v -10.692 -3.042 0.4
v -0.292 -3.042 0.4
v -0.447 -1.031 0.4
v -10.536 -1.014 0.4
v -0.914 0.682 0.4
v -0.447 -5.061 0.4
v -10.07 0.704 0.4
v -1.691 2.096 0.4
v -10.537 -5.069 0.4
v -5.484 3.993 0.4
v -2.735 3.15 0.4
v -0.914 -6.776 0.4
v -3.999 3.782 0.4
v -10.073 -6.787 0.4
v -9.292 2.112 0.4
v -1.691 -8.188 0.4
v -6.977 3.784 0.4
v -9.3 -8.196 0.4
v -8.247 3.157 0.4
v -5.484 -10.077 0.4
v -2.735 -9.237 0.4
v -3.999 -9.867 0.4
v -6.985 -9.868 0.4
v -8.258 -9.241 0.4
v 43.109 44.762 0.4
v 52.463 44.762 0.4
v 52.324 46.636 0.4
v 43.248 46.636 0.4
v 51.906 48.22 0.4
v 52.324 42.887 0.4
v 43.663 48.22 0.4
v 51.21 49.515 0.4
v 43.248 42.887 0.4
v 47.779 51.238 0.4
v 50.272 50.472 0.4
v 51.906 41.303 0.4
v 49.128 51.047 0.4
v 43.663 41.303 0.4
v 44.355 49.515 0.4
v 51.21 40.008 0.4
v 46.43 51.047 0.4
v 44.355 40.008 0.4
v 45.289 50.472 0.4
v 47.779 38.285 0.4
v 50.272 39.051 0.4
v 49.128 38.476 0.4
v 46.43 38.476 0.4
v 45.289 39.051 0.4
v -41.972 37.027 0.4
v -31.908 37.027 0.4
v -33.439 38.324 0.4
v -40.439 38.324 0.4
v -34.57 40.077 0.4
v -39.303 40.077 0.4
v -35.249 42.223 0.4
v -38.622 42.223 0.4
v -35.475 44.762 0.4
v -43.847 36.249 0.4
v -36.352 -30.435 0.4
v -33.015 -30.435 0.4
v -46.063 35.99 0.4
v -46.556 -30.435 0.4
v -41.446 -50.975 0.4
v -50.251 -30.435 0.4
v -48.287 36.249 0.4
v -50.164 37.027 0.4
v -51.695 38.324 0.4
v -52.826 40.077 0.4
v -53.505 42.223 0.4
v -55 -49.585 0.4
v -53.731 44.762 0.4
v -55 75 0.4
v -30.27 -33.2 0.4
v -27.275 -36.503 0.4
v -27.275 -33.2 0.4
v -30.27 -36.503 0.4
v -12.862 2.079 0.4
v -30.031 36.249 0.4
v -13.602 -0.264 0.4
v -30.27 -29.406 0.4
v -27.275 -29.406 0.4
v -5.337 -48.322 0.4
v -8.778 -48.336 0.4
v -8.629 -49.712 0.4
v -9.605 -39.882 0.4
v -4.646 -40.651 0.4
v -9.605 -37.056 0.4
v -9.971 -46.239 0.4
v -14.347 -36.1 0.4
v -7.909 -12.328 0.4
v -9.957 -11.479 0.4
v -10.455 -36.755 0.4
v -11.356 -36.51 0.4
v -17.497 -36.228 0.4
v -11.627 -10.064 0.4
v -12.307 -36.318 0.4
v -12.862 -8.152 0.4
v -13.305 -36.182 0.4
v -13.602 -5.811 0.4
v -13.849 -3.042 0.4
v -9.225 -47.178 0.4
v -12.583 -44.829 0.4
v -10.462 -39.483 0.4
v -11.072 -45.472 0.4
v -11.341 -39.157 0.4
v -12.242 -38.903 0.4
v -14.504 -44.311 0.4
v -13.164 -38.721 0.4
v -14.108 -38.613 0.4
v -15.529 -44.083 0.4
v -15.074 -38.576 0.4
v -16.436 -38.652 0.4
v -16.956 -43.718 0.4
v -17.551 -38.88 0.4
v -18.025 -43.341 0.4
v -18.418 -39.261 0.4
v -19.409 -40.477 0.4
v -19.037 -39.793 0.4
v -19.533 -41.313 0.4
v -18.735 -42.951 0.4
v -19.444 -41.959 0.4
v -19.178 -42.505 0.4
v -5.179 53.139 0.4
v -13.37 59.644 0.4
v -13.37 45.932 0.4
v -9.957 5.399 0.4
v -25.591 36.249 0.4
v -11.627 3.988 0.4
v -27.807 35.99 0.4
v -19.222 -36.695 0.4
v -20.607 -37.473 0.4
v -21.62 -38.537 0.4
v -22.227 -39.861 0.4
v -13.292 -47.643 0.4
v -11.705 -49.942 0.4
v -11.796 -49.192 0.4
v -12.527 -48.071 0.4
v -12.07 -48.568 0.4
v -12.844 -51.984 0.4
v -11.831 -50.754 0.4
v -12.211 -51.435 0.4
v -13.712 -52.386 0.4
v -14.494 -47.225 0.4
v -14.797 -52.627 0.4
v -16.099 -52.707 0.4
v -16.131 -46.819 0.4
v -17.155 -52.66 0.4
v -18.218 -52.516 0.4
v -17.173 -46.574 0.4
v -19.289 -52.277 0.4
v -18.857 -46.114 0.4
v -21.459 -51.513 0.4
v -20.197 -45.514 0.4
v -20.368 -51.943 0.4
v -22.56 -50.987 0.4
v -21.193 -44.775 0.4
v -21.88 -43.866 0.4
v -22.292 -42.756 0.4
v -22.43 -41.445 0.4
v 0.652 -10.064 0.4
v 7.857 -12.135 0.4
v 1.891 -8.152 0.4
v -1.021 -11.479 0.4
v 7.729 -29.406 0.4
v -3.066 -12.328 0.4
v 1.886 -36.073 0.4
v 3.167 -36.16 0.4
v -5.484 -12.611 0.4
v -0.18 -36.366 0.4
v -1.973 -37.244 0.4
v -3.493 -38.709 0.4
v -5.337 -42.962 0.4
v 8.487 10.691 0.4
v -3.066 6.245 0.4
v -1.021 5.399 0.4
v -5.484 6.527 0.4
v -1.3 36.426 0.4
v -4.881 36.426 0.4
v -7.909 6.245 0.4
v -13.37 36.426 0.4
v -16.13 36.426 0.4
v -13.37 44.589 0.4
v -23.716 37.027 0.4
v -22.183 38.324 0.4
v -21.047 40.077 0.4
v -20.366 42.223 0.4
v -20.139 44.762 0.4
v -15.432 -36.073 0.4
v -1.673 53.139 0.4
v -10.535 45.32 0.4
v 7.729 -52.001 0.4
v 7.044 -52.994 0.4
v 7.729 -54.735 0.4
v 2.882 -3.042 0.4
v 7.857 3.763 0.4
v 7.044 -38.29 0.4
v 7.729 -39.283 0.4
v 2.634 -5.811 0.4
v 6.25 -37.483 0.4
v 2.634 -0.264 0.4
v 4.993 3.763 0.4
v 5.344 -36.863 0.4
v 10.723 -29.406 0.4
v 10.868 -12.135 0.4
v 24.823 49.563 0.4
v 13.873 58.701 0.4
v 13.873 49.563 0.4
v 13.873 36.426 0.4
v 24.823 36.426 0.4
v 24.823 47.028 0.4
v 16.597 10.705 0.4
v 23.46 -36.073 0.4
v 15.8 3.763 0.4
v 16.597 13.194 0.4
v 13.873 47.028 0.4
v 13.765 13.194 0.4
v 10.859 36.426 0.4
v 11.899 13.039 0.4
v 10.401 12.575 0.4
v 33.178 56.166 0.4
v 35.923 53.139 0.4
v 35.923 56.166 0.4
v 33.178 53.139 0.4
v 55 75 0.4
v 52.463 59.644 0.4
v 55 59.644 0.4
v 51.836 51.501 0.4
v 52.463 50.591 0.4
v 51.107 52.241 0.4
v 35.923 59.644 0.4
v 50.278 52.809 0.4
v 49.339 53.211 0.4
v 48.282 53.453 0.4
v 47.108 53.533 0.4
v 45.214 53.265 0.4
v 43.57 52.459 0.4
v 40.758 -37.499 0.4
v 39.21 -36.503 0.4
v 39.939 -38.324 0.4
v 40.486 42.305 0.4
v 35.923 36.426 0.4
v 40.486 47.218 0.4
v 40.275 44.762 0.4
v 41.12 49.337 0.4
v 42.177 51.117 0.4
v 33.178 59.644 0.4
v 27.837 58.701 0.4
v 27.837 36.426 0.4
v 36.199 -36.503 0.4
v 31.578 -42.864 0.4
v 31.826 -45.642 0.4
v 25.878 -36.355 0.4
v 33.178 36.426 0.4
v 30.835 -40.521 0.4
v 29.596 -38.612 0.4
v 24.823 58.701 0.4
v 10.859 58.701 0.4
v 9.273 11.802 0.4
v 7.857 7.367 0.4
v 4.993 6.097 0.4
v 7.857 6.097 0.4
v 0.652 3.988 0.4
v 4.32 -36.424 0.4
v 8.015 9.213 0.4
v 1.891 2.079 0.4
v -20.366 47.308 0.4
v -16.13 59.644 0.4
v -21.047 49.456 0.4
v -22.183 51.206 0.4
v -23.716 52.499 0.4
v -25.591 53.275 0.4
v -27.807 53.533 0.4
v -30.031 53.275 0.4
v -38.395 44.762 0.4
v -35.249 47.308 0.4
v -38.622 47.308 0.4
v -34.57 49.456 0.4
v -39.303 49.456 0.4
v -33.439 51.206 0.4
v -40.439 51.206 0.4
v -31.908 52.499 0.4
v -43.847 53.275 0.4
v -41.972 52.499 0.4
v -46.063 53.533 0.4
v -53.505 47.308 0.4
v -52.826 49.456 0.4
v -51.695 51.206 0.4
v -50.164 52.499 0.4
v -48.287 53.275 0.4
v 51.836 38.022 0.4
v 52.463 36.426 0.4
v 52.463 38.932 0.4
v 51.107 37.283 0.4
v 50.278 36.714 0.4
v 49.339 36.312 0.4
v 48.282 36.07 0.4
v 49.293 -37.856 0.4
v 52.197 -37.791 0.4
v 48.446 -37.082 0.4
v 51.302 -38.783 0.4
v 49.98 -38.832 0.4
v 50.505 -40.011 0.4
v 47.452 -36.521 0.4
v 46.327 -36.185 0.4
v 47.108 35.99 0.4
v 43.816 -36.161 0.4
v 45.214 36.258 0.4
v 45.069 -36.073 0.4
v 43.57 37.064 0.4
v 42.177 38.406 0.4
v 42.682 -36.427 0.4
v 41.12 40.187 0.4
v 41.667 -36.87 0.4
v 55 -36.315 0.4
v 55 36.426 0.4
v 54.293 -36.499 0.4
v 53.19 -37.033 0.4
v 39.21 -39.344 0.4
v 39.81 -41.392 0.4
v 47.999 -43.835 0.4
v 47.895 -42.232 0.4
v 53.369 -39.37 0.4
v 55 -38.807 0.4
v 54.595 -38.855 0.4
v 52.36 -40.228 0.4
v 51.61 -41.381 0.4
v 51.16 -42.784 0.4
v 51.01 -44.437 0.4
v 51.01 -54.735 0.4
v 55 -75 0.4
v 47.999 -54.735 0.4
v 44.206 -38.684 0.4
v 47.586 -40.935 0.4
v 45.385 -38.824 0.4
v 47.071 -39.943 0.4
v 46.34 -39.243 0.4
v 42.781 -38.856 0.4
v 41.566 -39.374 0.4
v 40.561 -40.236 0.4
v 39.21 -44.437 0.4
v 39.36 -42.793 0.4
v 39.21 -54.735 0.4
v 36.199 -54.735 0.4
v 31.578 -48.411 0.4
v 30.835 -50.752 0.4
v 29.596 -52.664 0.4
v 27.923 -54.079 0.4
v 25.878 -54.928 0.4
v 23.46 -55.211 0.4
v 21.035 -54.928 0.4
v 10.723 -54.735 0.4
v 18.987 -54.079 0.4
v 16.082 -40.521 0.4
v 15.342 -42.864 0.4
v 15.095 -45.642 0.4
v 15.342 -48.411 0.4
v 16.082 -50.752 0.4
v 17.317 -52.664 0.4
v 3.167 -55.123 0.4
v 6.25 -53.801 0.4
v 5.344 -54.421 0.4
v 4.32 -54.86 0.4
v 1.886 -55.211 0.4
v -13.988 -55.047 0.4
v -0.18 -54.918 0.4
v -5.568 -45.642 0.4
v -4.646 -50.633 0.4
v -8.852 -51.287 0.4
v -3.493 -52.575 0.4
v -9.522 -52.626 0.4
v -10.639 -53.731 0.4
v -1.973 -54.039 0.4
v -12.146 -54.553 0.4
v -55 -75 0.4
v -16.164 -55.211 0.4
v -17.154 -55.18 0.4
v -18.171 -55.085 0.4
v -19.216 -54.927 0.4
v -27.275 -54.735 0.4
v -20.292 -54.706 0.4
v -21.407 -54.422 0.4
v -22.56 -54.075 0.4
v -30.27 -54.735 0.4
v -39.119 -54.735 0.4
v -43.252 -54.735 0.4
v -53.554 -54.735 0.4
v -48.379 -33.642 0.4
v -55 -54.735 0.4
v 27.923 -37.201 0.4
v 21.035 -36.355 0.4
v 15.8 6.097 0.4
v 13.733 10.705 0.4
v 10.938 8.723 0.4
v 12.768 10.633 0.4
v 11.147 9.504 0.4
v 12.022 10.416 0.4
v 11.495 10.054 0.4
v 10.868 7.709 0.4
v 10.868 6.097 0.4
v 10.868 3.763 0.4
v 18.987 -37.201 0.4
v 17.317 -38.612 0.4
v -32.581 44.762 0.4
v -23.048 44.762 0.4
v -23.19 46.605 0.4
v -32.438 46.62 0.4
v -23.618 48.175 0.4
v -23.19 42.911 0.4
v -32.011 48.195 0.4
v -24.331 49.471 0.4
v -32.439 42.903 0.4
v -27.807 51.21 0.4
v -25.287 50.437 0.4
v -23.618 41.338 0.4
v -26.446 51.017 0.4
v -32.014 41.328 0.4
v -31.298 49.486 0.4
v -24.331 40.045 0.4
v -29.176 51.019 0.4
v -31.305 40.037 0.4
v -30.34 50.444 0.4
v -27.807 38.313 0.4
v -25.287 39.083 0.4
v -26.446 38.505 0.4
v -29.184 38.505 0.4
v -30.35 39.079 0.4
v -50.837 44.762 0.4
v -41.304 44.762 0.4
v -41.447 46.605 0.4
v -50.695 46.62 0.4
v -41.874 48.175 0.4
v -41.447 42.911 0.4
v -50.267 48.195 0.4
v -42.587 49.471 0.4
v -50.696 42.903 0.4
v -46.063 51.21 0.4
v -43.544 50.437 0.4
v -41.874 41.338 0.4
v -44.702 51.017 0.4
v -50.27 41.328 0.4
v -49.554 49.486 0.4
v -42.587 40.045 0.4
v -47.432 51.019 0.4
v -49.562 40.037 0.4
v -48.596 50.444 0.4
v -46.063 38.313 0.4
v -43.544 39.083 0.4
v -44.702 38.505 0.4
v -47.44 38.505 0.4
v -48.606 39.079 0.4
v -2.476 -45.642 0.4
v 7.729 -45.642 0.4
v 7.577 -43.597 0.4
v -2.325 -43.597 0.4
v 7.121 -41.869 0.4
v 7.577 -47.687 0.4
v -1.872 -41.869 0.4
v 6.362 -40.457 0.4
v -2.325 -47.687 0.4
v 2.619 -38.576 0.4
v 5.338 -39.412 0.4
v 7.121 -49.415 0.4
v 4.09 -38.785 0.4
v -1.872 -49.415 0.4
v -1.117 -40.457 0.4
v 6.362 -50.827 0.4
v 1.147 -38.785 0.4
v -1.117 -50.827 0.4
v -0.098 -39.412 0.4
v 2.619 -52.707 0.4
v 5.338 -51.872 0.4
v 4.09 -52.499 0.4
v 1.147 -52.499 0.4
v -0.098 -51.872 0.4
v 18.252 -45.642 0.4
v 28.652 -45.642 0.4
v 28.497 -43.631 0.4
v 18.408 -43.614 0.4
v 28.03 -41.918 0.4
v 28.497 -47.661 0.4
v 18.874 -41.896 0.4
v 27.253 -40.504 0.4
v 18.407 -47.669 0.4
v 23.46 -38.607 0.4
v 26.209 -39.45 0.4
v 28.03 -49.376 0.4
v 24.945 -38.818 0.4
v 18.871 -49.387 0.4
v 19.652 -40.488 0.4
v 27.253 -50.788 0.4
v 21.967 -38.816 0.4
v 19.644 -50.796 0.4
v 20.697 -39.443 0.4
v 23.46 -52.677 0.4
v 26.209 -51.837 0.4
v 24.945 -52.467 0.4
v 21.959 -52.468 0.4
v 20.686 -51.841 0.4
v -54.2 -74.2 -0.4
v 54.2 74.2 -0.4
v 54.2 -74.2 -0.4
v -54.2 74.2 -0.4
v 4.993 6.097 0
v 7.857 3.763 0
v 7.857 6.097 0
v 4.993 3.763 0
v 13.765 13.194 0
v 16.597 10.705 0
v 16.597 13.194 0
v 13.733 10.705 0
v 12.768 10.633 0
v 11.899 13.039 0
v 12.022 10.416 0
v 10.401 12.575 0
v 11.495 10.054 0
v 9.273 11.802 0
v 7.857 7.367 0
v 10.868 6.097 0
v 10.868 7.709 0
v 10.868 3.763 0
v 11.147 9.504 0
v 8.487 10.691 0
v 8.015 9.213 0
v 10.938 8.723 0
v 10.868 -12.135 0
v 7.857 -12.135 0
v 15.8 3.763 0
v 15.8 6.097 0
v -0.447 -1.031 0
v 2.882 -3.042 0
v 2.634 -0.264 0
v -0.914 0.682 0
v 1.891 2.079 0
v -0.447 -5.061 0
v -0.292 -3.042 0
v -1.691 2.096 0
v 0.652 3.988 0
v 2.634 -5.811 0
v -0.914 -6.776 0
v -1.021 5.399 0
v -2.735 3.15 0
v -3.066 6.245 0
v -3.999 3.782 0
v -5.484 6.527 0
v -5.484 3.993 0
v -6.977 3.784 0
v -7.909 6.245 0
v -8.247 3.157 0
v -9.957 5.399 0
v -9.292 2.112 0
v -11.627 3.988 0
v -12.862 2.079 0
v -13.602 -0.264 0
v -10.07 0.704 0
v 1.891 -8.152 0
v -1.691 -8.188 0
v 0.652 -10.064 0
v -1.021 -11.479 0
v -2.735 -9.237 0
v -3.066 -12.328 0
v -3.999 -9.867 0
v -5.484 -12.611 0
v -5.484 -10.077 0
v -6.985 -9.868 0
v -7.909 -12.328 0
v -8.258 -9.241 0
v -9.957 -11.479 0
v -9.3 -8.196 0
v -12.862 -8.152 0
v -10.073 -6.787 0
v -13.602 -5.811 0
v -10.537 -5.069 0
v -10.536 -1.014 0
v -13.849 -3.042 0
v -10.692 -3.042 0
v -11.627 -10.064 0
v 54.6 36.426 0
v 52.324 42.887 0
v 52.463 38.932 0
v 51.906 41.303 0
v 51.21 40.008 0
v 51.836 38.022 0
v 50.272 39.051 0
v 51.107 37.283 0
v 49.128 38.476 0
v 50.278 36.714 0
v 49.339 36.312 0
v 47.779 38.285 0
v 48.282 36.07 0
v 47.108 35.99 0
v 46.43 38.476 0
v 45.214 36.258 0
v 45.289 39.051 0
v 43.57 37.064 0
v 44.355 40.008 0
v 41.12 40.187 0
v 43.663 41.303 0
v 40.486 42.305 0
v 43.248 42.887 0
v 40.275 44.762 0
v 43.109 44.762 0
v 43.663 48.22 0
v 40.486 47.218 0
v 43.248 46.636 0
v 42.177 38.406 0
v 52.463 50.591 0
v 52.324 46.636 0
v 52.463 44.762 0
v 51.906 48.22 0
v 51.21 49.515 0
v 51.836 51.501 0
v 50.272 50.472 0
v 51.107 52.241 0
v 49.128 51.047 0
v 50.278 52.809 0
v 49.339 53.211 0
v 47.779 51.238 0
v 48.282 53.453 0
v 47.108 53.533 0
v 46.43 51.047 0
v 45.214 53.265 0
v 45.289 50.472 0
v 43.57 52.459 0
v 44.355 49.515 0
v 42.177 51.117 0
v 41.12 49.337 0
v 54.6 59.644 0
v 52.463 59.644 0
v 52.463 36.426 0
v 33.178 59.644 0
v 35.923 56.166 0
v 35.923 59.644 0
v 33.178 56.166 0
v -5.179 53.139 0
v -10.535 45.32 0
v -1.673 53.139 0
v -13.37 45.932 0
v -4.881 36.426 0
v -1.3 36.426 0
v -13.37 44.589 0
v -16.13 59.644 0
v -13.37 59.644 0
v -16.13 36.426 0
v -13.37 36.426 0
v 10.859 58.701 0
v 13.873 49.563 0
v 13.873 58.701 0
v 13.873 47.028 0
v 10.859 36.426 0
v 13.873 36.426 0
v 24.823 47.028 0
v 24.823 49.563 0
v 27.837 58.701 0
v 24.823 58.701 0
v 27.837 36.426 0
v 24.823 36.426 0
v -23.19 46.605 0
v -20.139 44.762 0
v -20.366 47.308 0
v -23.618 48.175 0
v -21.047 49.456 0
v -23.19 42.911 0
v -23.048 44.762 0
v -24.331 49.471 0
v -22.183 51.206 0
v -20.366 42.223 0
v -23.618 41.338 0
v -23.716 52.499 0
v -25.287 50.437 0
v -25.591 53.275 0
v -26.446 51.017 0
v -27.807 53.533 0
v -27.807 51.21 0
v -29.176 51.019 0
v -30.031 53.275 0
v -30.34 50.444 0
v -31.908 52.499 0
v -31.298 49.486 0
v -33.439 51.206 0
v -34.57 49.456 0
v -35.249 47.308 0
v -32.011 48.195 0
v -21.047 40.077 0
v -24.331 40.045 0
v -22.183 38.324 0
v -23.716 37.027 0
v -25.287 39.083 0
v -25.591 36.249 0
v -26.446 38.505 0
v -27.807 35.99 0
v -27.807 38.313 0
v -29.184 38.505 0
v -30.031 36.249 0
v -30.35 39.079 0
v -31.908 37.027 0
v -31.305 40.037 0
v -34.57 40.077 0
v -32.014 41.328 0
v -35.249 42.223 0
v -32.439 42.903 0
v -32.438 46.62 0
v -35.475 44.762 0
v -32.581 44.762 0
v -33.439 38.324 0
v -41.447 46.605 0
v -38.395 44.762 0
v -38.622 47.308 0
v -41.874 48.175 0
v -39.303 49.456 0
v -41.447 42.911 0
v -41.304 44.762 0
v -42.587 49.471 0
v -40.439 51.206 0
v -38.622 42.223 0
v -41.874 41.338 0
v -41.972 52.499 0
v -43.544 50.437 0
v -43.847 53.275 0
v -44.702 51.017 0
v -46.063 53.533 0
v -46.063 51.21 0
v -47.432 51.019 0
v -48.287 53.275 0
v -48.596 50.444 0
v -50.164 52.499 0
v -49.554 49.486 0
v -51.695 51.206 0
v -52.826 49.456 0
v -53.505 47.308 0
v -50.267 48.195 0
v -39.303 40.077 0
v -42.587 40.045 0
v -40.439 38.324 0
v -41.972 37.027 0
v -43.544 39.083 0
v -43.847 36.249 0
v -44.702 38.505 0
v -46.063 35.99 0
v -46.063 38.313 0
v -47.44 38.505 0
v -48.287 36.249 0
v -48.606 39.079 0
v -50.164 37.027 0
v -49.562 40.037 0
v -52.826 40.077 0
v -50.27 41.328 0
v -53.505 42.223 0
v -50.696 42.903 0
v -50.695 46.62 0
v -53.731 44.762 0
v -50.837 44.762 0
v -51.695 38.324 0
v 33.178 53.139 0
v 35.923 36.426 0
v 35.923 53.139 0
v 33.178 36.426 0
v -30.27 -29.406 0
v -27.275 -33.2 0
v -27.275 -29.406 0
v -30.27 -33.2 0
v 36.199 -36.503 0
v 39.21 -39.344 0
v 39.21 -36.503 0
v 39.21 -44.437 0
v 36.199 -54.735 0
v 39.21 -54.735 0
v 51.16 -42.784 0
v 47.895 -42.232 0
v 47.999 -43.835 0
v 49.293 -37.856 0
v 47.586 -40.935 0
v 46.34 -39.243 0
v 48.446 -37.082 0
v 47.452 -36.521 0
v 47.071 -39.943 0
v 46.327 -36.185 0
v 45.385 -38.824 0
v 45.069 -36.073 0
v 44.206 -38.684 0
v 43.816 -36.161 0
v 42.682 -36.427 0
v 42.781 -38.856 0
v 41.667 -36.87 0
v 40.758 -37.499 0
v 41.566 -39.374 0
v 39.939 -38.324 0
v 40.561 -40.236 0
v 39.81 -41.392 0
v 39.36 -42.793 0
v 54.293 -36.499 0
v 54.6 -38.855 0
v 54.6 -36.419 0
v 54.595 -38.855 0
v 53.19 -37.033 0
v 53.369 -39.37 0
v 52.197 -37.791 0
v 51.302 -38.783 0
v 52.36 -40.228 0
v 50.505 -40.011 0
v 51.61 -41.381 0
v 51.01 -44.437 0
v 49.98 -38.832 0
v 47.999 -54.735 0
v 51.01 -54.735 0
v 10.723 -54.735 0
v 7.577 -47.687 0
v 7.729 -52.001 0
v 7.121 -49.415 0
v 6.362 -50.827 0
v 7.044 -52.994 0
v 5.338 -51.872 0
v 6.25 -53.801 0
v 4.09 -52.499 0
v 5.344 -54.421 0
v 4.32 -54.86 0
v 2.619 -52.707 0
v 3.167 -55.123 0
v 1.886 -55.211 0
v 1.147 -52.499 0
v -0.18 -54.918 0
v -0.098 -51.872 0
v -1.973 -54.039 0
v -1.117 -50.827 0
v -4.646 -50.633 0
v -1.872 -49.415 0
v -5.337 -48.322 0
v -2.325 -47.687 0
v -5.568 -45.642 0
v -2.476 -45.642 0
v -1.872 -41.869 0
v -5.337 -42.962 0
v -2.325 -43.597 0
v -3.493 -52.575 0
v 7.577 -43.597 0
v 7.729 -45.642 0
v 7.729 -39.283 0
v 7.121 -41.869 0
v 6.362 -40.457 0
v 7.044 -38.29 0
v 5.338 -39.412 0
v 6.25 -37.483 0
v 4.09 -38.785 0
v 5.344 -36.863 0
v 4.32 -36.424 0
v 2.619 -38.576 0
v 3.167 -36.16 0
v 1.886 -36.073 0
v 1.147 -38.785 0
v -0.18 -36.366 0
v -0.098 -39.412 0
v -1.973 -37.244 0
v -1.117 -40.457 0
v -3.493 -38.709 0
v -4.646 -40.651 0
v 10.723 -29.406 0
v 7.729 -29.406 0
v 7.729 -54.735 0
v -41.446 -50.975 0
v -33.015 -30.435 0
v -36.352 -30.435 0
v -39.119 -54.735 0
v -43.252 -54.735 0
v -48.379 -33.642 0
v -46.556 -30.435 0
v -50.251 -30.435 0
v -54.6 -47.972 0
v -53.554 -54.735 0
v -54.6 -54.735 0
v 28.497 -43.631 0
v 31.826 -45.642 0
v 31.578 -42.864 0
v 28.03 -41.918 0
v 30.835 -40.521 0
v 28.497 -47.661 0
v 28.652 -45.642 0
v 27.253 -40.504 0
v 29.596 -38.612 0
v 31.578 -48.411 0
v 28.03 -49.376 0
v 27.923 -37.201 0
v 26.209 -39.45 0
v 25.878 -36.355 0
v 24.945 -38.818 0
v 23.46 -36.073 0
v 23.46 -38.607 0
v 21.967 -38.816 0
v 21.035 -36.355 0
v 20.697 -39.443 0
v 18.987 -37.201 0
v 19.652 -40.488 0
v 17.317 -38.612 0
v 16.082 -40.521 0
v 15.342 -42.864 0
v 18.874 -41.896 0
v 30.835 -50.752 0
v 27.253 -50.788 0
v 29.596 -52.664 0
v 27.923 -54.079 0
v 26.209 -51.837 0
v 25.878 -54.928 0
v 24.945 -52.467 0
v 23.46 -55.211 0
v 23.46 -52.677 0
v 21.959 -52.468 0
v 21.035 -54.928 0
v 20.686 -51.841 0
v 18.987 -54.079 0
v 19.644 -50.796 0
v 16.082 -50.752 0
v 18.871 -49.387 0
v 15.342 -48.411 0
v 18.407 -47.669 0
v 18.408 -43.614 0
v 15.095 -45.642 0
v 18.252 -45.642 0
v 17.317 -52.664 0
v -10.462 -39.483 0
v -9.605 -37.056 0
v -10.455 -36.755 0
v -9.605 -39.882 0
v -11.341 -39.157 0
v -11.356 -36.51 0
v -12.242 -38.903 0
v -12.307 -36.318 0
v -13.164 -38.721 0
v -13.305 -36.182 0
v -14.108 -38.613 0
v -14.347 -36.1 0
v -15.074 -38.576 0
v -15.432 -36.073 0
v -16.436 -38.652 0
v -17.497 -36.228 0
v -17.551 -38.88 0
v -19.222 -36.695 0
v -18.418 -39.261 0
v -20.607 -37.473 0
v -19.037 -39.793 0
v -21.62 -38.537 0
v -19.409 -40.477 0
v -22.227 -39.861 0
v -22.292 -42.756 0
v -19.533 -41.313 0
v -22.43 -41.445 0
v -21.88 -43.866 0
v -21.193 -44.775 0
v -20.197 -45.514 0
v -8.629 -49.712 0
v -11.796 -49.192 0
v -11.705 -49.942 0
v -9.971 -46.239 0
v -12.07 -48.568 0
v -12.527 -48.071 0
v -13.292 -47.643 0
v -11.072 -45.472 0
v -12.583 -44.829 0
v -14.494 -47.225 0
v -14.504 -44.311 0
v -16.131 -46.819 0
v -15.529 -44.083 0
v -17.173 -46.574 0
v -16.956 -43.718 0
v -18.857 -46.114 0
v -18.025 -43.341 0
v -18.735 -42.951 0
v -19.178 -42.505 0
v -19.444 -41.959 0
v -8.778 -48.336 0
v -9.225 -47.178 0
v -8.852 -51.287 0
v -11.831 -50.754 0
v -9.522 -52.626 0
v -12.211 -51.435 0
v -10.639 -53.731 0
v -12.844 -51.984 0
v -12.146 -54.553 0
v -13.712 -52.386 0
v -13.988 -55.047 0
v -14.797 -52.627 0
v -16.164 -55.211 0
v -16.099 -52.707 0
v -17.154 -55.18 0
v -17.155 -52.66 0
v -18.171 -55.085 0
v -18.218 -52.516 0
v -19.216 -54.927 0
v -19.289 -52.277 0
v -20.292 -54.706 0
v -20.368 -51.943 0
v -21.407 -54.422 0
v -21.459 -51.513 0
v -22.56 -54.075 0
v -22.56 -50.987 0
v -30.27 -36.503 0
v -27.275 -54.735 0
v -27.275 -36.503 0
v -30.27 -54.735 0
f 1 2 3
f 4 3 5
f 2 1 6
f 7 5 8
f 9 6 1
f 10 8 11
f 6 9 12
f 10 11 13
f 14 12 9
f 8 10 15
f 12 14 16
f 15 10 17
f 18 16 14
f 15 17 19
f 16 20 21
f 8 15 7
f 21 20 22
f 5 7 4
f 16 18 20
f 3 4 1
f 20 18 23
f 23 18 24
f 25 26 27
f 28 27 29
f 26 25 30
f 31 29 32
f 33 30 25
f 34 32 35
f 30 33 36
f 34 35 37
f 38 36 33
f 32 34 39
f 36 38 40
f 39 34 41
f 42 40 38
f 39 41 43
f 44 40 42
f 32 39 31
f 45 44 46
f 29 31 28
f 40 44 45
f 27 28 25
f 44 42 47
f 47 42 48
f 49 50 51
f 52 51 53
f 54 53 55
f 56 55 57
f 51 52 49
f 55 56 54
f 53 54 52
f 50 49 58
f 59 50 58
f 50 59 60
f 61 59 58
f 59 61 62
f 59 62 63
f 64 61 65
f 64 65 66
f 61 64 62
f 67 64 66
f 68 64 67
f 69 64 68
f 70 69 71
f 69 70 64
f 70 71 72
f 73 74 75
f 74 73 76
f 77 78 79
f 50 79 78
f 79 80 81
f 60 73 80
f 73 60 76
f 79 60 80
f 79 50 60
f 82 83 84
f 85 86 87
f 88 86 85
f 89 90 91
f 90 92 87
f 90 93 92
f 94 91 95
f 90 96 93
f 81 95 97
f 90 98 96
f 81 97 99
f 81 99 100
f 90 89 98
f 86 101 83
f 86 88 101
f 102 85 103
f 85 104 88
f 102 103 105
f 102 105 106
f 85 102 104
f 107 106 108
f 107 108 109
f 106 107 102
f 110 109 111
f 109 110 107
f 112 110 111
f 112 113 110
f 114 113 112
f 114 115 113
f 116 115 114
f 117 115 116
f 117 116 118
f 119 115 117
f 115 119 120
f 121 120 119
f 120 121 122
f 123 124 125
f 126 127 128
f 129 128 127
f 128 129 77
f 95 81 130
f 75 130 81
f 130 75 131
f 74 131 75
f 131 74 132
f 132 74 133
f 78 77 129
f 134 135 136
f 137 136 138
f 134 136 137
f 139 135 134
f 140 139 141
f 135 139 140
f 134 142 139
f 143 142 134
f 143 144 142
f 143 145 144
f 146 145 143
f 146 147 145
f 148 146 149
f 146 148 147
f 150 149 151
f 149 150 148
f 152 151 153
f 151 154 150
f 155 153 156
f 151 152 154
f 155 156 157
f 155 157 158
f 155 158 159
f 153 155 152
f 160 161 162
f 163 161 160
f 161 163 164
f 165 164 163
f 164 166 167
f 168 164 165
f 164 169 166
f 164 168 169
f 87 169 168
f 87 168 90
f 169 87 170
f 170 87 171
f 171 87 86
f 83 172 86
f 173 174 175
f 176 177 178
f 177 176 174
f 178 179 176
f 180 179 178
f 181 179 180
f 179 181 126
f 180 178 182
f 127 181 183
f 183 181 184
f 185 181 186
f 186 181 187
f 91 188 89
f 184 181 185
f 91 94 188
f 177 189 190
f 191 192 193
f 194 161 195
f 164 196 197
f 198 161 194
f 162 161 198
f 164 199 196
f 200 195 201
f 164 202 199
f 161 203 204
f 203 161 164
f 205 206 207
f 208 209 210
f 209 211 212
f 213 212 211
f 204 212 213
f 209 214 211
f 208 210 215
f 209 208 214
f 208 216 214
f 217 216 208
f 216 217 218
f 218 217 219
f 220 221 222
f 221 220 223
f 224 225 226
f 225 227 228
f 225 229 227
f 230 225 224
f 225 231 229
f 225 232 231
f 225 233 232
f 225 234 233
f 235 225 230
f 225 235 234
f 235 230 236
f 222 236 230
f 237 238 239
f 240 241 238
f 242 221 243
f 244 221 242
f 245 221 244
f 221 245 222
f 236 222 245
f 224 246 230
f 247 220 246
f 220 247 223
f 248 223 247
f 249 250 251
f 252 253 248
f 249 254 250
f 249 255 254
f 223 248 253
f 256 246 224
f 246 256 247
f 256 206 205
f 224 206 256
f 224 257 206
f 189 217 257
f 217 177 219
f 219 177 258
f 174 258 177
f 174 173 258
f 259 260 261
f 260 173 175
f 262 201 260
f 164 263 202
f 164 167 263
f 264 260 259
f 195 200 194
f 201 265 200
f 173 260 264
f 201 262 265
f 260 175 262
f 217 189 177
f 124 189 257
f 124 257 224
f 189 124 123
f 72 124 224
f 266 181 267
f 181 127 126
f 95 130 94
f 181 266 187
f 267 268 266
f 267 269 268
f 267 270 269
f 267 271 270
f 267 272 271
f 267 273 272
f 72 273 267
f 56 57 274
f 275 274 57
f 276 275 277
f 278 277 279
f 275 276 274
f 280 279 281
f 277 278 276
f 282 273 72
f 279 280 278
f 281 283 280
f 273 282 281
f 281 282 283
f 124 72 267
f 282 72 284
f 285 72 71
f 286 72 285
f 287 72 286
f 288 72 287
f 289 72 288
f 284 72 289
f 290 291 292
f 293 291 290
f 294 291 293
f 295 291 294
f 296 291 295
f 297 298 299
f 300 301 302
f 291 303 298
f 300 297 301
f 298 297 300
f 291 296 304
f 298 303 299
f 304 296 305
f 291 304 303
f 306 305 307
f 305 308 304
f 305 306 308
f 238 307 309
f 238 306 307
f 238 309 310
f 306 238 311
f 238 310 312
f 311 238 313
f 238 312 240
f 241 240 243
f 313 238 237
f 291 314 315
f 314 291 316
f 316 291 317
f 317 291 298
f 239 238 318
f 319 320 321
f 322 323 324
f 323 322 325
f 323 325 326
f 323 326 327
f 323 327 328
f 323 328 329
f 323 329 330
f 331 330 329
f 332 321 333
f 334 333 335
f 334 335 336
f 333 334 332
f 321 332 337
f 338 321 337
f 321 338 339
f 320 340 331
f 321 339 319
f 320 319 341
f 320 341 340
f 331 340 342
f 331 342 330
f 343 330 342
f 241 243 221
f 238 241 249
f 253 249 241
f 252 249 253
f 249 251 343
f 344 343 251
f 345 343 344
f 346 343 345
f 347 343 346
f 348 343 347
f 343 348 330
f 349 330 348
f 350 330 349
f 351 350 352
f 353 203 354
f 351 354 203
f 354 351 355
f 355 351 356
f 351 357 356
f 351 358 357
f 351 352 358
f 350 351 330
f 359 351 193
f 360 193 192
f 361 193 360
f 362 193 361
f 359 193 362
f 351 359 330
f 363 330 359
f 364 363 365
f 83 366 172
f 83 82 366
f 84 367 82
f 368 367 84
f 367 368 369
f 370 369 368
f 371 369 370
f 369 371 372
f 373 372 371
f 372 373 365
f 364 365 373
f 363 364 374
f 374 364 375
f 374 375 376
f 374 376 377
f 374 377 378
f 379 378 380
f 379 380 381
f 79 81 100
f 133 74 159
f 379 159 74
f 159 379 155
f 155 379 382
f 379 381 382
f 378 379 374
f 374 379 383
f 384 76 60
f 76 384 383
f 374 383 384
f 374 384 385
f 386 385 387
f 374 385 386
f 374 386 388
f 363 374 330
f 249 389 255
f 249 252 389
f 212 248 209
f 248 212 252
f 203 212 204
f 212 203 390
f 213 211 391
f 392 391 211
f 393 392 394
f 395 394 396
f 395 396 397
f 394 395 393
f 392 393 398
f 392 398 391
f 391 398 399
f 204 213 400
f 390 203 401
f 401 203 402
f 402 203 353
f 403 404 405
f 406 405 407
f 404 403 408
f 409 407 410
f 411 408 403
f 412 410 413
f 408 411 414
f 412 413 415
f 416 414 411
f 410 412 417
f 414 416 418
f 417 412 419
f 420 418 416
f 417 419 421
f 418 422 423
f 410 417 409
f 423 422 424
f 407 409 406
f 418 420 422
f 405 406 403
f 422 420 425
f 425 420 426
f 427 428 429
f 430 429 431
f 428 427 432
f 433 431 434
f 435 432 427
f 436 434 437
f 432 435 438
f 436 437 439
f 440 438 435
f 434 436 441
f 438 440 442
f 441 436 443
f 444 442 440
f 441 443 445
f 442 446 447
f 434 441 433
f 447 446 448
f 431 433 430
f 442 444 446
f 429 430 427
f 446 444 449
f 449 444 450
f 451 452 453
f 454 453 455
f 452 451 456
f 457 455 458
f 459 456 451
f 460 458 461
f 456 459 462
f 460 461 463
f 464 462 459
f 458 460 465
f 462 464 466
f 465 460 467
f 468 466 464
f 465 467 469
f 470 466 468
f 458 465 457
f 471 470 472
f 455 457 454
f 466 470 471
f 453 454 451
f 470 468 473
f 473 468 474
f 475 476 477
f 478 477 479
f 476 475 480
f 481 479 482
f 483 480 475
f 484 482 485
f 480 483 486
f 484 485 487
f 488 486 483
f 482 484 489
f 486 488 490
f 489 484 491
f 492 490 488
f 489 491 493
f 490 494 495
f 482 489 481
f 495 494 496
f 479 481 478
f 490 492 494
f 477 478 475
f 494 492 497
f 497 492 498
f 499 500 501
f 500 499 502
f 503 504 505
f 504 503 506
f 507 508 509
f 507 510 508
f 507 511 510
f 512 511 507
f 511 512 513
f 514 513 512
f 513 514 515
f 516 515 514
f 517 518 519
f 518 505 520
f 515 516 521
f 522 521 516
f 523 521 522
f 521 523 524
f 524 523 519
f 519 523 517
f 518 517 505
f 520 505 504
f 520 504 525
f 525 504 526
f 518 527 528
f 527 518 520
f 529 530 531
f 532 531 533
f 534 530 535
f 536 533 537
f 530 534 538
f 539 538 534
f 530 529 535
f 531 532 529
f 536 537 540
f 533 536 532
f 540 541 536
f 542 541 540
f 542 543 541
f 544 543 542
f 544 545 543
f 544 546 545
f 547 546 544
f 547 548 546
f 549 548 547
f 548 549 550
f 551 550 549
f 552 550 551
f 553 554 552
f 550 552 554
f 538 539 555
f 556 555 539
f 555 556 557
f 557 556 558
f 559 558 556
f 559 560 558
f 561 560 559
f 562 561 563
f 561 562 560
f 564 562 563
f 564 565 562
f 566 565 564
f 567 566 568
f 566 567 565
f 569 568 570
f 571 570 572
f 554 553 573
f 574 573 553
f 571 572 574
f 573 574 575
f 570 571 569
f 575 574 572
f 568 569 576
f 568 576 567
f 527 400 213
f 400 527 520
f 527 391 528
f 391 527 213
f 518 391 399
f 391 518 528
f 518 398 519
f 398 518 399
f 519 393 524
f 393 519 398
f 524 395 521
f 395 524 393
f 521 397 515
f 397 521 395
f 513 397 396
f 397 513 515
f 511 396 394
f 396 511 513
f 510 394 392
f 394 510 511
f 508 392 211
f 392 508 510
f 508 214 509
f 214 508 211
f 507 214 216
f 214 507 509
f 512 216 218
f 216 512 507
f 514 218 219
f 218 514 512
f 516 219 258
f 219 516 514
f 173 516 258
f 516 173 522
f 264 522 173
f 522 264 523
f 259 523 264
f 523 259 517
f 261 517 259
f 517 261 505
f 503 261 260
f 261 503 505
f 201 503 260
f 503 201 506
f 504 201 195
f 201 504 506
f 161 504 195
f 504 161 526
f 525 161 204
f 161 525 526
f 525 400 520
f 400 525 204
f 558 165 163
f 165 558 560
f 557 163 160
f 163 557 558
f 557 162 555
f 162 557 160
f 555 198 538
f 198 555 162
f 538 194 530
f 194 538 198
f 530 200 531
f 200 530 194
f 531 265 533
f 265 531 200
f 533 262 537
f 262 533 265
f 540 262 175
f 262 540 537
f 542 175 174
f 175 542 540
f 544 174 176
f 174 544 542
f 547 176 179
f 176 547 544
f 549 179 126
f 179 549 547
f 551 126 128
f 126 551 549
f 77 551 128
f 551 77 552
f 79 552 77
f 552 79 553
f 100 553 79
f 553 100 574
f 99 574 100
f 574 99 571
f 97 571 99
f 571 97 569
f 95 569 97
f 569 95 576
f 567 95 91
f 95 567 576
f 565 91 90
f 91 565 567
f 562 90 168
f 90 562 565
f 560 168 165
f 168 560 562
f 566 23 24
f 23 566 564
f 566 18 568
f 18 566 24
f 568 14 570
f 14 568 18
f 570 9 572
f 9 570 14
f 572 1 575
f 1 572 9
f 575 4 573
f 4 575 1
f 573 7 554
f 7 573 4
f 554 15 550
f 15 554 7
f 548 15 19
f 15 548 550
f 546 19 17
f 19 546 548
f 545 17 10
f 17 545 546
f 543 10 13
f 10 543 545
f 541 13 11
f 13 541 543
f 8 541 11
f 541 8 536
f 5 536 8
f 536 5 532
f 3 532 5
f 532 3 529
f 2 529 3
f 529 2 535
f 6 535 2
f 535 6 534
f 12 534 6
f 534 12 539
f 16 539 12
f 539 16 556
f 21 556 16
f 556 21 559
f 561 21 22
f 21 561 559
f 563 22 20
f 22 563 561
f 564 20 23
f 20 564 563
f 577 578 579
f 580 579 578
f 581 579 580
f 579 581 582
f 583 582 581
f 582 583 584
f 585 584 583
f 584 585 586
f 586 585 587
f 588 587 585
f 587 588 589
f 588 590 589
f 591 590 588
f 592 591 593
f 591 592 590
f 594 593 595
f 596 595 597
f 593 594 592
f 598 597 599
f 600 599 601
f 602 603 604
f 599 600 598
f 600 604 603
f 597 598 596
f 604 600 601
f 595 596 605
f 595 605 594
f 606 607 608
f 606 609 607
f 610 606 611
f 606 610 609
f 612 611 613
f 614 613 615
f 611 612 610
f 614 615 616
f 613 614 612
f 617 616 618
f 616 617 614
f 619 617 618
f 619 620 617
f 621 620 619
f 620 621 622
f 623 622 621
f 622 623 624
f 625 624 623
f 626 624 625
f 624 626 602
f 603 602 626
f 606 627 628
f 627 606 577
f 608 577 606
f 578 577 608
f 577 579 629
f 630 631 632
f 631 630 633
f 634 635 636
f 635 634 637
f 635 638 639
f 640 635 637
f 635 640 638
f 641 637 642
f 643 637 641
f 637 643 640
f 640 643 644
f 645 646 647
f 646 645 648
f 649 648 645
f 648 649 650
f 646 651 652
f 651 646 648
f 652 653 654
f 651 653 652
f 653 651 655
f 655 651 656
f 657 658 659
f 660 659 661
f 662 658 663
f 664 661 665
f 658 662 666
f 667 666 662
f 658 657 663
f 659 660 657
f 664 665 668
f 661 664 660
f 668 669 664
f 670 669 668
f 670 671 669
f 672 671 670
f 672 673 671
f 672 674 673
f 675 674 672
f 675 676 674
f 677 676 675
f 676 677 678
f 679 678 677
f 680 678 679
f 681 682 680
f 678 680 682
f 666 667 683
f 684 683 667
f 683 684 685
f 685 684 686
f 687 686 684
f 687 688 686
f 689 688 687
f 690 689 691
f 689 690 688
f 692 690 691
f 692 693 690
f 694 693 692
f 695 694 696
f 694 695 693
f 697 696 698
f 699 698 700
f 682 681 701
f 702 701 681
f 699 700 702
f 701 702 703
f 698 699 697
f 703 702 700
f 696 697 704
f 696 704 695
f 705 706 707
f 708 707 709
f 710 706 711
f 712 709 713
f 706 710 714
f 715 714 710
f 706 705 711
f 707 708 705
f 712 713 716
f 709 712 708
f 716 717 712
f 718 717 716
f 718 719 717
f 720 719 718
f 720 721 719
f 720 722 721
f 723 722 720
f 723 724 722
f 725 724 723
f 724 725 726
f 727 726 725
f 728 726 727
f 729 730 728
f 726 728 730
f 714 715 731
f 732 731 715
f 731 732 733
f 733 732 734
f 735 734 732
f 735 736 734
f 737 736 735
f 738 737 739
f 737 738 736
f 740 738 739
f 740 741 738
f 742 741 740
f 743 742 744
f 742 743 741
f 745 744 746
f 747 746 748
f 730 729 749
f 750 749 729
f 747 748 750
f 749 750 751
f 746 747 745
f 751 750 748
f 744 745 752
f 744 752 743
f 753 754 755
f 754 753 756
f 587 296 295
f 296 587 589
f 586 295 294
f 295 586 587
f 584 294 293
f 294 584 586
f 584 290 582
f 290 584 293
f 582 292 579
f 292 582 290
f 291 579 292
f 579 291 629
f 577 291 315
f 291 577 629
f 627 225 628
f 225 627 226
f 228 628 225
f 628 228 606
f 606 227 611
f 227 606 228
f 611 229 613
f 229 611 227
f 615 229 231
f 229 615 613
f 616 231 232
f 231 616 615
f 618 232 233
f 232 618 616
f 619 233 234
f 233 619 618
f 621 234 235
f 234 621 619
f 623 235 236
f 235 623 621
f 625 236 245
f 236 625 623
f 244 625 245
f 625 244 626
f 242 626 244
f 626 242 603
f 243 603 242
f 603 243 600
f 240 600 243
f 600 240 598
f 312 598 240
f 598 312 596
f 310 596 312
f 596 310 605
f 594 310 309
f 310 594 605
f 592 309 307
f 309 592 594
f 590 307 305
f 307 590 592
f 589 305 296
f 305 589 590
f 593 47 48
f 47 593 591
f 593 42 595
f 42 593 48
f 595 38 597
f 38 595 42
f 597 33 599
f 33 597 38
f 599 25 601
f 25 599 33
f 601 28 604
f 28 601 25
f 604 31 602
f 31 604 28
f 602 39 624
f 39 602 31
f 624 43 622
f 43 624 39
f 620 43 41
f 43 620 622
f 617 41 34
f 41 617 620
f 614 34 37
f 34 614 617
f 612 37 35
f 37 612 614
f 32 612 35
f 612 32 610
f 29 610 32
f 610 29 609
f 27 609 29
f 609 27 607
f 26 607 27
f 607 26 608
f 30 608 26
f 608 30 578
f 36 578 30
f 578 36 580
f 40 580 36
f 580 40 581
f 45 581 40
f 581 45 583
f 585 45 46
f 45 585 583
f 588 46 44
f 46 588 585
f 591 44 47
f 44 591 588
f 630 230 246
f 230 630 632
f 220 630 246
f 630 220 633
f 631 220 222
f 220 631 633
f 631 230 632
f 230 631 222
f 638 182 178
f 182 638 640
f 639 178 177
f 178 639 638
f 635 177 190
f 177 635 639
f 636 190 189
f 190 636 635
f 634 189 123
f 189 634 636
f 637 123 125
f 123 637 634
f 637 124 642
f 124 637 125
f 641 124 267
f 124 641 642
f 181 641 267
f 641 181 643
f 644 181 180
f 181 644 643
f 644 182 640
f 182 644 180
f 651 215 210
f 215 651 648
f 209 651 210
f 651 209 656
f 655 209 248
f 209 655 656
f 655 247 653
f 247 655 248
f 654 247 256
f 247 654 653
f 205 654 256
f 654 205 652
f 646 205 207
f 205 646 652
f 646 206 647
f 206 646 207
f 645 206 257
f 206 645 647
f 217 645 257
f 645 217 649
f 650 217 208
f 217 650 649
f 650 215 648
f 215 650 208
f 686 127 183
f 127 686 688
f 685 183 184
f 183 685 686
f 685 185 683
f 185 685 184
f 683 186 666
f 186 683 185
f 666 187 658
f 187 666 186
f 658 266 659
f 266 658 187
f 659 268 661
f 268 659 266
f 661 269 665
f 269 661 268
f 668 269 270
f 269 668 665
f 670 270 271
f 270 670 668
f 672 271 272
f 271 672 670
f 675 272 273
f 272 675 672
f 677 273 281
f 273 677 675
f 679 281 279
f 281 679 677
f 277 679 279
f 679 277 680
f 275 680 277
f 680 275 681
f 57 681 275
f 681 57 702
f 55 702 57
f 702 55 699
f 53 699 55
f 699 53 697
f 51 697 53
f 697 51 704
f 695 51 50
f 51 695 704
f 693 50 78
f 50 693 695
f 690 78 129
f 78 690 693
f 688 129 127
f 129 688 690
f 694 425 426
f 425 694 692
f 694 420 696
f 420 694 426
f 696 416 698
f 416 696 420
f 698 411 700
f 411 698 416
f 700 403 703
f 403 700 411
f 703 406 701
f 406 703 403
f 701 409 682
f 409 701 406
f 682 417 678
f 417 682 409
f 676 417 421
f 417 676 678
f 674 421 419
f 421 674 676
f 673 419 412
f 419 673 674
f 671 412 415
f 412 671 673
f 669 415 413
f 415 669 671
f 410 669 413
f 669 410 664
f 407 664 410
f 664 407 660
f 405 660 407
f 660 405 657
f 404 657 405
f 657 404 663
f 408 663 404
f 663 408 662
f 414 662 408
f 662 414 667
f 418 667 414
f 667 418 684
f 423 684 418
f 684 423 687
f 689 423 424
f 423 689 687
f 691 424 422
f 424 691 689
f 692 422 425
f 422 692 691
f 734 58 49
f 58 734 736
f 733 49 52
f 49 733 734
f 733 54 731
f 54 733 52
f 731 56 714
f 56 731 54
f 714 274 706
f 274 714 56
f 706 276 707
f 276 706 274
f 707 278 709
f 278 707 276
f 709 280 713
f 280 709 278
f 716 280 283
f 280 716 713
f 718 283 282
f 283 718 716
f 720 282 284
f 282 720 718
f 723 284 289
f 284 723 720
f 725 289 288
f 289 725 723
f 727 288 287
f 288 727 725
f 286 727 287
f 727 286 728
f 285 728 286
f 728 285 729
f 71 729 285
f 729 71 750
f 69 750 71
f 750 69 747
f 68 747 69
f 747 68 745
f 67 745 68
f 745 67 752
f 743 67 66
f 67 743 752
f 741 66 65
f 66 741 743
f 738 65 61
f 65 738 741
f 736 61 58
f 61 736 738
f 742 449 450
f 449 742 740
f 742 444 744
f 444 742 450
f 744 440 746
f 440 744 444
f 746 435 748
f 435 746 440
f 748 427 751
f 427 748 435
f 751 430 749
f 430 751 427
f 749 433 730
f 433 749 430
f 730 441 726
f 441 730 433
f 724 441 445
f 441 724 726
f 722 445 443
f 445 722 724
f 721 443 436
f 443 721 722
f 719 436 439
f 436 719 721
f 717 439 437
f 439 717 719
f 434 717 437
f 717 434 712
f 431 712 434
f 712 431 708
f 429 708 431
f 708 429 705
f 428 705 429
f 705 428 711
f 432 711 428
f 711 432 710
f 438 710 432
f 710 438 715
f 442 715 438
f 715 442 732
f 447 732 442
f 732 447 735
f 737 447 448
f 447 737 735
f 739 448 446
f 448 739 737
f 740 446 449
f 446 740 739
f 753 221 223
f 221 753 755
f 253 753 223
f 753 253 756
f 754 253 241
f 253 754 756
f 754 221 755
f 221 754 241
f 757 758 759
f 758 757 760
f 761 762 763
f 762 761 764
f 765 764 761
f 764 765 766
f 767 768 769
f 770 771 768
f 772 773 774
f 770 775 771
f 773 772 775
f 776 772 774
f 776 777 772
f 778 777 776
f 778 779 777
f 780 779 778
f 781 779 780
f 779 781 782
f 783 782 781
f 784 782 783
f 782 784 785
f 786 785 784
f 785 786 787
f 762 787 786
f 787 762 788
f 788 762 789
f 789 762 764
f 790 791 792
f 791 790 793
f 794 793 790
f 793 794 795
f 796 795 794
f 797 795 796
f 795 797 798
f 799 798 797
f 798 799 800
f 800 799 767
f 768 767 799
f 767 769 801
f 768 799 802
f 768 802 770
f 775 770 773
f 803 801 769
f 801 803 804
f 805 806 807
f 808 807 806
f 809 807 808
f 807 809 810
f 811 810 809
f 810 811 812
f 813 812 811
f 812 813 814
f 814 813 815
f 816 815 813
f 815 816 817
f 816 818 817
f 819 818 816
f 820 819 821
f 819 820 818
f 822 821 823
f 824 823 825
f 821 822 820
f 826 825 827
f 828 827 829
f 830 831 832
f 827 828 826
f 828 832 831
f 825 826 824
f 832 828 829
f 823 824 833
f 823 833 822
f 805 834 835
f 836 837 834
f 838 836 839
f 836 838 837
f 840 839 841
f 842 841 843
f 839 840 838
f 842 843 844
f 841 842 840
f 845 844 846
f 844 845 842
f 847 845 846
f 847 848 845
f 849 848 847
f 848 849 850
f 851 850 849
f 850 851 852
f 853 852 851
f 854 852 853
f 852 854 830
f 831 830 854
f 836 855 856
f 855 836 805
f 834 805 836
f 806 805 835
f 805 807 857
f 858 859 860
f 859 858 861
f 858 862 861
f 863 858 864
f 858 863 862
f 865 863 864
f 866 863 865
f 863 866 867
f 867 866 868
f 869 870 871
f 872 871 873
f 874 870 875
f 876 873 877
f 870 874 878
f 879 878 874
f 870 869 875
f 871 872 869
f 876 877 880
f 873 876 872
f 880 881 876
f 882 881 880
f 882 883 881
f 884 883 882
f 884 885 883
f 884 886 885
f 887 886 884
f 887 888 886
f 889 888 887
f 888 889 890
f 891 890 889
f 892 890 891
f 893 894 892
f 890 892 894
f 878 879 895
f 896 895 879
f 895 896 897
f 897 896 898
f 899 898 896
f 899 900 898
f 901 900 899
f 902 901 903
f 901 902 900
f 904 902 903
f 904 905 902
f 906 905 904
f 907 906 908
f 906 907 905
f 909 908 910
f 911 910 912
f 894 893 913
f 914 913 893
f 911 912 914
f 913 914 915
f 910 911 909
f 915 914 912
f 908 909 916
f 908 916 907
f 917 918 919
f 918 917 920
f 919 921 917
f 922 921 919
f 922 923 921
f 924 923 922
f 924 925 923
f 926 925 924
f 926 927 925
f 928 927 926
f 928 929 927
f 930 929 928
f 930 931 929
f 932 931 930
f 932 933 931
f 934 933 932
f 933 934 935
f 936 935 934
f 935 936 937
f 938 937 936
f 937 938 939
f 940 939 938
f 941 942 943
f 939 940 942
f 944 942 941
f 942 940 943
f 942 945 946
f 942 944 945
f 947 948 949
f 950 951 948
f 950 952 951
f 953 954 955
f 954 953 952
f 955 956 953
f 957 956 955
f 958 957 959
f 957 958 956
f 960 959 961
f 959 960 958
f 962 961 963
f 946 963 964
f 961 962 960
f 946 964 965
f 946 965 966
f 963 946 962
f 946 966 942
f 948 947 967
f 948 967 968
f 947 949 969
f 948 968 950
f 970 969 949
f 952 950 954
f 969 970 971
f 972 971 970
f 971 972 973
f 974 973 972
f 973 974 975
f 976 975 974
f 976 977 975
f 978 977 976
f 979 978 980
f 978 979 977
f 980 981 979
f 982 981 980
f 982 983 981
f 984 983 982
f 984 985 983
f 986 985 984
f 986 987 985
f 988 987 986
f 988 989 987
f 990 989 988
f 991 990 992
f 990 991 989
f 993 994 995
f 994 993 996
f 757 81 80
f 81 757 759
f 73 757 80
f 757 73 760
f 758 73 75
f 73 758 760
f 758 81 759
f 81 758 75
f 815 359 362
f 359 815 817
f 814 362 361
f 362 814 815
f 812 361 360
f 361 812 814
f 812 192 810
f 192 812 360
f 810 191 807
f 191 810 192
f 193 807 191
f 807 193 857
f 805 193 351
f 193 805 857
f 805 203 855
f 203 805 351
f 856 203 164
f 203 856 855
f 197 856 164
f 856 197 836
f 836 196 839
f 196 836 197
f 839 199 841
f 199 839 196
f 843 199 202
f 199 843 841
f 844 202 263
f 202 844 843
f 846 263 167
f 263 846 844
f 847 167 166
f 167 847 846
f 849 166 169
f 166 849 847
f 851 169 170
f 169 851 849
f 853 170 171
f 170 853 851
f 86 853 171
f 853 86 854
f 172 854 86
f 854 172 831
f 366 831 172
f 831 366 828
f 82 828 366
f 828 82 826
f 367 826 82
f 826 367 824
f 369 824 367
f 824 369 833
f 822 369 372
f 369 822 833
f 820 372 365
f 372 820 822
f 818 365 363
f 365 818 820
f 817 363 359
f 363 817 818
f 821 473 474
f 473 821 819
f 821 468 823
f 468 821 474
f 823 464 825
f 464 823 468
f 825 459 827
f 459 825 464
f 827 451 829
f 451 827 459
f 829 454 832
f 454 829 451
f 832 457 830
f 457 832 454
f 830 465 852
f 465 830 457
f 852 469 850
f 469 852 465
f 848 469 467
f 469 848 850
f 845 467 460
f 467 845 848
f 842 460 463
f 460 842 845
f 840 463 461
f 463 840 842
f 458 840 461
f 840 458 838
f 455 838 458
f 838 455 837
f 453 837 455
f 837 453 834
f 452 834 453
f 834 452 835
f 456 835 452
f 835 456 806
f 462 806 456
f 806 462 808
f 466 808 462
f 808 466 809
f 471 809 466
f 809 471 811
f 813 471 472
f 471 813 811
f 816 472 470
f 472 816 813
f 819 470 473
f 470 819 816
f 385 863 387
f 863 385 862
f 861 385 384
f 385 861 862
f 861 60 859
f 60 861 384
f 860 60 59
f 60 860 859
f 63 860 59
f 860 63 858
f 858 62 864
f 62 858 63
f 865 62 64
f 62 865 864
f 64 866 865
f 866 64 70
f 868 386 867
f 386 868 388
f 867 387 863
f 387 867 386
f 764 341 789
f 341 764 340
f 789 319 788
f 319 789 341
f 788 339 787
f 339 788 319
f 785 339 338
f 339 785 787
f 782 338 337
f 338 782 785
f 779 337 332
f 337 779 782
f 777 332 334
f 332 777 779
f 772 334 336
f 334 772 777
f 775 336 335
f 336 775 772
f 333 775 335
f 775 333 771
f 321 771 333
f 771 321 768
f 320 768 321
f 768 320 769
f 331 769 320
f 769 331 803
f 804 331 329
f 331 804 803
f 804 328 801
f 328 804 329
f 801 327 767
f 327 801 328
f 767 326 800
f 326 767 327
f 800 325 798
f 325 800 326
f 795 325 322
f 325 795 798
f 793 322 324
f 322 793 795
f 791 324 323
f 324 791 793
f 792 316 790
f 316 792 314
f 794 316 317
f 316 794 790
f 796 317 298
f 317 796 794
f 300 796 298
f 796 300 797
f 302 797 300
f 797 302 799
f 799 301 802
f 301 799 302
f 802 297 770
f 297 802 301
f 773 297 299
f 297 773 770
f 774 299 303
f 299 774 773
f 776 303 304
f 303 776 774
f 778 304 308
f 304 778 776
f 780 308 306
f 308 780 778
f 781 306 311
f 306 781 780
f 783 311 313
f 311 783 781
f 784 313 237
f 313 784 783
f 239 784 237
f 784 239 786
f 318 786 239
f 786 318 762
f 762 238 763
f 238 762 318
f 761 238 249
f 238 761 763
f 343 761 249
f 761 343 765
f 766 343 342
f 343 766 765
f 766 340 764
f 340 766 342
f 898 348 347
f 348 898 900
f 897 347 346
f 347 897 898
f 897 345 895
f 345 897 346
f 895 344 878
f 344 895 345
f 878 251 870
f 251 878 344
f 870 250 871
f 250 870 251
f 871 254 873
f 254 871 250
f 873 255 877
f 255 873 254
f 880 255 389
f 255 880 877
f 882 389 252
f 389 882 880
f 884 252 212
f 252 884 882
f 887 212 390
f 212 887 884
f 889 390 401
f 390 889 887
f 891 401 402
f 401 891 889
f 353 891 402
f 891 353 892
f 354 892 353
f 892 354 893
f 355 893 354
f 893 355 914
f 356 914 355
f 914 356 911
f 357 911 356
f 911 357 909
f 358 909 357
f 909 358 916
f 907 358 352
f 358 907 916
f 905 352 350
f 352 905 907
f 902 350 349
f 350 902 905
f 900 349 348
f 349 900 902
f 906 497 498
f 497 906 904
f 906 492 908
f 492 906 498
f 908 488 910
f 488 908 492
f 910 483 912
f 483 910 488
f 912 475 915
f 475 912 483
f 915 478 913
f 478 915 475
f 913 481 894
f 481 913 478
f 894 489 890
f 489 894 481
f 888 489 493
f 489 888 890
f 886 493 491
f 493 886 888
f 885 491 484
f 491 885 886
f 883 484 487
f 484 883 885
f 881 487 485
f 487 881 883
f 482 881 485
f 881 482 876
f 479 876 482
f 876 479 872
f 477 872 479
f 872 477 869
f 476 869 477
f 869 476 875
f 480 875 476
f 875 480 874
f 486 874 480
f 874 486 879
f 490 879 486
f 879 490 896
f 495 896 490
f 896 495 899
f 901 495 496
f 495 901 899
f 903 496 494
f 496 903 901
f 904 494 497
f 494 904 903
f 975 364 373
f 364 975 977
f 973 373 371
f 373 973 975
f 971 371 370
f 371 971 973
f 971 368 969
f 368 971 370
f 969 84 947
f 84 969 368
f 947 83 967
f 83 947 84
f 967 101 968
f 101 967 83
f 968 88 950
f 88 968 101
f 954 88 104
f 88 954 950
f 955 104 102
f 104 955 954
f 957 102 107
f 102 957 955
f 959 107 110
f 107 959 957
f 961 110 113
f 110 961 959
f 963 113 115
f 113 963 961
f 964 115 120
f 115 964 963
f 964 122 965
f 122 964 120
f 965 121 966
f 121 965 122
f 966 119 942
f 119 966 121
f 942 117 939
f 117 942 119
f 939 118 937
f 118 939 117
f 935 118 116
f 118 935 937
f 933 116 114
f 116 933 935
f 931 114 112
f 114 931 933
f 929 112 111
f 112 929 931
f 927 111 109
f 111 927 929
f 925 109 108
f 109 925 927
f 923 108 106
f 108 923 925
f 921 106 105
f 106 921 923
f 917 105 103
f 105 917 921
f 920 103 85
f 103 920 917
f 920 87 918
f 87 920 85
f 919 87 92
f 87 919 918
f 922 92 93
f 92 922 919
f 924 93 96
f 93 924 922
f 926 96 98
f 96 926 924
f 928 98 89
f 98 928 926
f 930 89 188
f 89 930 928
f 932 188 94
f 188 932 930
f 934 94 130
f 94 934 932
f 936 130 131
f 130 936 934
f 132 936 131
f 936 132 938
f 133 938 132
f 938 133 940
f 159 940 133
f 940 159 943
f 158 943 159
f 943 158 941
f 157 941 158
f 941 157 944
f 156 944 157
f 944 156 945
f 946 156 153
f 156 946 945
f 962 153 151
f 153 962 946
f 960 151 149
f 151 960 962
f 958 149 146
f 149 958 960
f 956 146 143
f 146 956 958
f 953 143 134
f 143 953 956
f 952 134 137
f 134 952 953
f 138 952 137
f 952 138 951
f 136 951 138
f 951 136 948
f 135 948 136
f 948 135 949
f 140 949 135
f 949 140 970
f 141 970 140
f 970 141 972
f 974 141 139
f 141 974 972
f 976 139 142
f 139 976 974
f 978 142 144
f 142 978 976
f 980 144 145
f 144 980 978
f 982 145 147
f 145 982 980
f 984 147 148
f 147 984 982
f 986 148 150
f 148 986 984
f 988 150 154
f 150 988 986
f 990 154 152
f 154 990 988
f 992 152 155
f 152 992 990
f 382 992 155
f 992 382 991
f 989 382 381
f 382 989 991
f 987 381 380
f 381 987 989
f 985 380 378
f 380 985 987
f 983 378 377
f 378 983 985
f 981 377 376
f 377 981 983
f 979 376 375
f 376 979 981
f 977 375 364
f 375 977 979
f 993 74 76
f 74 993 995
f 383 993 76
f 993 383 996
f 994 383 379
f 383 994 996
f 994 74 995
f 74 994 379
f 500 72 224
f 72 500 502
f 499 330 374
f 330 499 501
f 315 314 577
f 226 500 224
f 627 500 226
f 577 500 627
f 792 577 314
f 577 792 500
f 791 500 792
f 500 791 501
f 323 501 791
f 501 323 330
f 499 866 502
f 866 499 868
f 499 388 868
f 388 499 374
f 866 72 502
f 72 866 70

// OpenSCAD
//Book Hide (Large)

//Text here appears on the top
text_top = "Book Hide";
//Size of the top text
size_top = 22;//[2:1:20]
//Vertical position of top text
top_position = 36;//[0:1:60]

//Text here appears on the center
text_center = "of";
//Size of the center text
size_center = 24;//[2:1:20]

//Text here appears on the bottom
text_bottom = "Wisdom";
//Size of the bottom text
size_bottom = 24;//[2:1:20]
//Vertical position of bottom text
bottom_position = -30;//[-50:1:0]

//Font. Type in the font name
font_family = "Mistral";
// Font weight. bold/italic/light
font_weight = "italic";

//Resolution. 
resolution = 20;//[10:10:100]

difference () {
    
translate([0,0,0])
cube([110,150,0.8],center=true);
linear_extrude(height=0.4) {
text(
    text_center,
    font = str(font_family, ":style=", font_weight),
    size=size_center,
    halign="center",
    valign="center");
}
translate ([0,top_position,0])
linear_extrude(height=0.4) {
text(
    text_top,
    font = str(font_family, ":style=", font_weight),
    size=size_top,
    halign="center",
    valign="bottom");
}
translate ([0,bottom_position,0])
linear_extrude(height=0.4) {
text(
    text_bottom,
    font = str(font_family, ":style=", font_weight),
    size=size_bottom,
    halign="center",
    valign="top");
}
translate([0,81.271,-0.4]) rotate([45,0,0]){
cube([110,10,10],center=true);
}
translate([0,-81.271,-0.4]) rotate([45,0,0]){
cube([110,10,10],center=true);
}
translate([61.271,0,-0.4]) rotate([0,45,0]){
cube([10,150,10],center=true);
}
translate([-61.271,0,-0.4]) rotate([0,45,0]){
cube([10,150,10],center=true);
}
}
$fn=resolution;
